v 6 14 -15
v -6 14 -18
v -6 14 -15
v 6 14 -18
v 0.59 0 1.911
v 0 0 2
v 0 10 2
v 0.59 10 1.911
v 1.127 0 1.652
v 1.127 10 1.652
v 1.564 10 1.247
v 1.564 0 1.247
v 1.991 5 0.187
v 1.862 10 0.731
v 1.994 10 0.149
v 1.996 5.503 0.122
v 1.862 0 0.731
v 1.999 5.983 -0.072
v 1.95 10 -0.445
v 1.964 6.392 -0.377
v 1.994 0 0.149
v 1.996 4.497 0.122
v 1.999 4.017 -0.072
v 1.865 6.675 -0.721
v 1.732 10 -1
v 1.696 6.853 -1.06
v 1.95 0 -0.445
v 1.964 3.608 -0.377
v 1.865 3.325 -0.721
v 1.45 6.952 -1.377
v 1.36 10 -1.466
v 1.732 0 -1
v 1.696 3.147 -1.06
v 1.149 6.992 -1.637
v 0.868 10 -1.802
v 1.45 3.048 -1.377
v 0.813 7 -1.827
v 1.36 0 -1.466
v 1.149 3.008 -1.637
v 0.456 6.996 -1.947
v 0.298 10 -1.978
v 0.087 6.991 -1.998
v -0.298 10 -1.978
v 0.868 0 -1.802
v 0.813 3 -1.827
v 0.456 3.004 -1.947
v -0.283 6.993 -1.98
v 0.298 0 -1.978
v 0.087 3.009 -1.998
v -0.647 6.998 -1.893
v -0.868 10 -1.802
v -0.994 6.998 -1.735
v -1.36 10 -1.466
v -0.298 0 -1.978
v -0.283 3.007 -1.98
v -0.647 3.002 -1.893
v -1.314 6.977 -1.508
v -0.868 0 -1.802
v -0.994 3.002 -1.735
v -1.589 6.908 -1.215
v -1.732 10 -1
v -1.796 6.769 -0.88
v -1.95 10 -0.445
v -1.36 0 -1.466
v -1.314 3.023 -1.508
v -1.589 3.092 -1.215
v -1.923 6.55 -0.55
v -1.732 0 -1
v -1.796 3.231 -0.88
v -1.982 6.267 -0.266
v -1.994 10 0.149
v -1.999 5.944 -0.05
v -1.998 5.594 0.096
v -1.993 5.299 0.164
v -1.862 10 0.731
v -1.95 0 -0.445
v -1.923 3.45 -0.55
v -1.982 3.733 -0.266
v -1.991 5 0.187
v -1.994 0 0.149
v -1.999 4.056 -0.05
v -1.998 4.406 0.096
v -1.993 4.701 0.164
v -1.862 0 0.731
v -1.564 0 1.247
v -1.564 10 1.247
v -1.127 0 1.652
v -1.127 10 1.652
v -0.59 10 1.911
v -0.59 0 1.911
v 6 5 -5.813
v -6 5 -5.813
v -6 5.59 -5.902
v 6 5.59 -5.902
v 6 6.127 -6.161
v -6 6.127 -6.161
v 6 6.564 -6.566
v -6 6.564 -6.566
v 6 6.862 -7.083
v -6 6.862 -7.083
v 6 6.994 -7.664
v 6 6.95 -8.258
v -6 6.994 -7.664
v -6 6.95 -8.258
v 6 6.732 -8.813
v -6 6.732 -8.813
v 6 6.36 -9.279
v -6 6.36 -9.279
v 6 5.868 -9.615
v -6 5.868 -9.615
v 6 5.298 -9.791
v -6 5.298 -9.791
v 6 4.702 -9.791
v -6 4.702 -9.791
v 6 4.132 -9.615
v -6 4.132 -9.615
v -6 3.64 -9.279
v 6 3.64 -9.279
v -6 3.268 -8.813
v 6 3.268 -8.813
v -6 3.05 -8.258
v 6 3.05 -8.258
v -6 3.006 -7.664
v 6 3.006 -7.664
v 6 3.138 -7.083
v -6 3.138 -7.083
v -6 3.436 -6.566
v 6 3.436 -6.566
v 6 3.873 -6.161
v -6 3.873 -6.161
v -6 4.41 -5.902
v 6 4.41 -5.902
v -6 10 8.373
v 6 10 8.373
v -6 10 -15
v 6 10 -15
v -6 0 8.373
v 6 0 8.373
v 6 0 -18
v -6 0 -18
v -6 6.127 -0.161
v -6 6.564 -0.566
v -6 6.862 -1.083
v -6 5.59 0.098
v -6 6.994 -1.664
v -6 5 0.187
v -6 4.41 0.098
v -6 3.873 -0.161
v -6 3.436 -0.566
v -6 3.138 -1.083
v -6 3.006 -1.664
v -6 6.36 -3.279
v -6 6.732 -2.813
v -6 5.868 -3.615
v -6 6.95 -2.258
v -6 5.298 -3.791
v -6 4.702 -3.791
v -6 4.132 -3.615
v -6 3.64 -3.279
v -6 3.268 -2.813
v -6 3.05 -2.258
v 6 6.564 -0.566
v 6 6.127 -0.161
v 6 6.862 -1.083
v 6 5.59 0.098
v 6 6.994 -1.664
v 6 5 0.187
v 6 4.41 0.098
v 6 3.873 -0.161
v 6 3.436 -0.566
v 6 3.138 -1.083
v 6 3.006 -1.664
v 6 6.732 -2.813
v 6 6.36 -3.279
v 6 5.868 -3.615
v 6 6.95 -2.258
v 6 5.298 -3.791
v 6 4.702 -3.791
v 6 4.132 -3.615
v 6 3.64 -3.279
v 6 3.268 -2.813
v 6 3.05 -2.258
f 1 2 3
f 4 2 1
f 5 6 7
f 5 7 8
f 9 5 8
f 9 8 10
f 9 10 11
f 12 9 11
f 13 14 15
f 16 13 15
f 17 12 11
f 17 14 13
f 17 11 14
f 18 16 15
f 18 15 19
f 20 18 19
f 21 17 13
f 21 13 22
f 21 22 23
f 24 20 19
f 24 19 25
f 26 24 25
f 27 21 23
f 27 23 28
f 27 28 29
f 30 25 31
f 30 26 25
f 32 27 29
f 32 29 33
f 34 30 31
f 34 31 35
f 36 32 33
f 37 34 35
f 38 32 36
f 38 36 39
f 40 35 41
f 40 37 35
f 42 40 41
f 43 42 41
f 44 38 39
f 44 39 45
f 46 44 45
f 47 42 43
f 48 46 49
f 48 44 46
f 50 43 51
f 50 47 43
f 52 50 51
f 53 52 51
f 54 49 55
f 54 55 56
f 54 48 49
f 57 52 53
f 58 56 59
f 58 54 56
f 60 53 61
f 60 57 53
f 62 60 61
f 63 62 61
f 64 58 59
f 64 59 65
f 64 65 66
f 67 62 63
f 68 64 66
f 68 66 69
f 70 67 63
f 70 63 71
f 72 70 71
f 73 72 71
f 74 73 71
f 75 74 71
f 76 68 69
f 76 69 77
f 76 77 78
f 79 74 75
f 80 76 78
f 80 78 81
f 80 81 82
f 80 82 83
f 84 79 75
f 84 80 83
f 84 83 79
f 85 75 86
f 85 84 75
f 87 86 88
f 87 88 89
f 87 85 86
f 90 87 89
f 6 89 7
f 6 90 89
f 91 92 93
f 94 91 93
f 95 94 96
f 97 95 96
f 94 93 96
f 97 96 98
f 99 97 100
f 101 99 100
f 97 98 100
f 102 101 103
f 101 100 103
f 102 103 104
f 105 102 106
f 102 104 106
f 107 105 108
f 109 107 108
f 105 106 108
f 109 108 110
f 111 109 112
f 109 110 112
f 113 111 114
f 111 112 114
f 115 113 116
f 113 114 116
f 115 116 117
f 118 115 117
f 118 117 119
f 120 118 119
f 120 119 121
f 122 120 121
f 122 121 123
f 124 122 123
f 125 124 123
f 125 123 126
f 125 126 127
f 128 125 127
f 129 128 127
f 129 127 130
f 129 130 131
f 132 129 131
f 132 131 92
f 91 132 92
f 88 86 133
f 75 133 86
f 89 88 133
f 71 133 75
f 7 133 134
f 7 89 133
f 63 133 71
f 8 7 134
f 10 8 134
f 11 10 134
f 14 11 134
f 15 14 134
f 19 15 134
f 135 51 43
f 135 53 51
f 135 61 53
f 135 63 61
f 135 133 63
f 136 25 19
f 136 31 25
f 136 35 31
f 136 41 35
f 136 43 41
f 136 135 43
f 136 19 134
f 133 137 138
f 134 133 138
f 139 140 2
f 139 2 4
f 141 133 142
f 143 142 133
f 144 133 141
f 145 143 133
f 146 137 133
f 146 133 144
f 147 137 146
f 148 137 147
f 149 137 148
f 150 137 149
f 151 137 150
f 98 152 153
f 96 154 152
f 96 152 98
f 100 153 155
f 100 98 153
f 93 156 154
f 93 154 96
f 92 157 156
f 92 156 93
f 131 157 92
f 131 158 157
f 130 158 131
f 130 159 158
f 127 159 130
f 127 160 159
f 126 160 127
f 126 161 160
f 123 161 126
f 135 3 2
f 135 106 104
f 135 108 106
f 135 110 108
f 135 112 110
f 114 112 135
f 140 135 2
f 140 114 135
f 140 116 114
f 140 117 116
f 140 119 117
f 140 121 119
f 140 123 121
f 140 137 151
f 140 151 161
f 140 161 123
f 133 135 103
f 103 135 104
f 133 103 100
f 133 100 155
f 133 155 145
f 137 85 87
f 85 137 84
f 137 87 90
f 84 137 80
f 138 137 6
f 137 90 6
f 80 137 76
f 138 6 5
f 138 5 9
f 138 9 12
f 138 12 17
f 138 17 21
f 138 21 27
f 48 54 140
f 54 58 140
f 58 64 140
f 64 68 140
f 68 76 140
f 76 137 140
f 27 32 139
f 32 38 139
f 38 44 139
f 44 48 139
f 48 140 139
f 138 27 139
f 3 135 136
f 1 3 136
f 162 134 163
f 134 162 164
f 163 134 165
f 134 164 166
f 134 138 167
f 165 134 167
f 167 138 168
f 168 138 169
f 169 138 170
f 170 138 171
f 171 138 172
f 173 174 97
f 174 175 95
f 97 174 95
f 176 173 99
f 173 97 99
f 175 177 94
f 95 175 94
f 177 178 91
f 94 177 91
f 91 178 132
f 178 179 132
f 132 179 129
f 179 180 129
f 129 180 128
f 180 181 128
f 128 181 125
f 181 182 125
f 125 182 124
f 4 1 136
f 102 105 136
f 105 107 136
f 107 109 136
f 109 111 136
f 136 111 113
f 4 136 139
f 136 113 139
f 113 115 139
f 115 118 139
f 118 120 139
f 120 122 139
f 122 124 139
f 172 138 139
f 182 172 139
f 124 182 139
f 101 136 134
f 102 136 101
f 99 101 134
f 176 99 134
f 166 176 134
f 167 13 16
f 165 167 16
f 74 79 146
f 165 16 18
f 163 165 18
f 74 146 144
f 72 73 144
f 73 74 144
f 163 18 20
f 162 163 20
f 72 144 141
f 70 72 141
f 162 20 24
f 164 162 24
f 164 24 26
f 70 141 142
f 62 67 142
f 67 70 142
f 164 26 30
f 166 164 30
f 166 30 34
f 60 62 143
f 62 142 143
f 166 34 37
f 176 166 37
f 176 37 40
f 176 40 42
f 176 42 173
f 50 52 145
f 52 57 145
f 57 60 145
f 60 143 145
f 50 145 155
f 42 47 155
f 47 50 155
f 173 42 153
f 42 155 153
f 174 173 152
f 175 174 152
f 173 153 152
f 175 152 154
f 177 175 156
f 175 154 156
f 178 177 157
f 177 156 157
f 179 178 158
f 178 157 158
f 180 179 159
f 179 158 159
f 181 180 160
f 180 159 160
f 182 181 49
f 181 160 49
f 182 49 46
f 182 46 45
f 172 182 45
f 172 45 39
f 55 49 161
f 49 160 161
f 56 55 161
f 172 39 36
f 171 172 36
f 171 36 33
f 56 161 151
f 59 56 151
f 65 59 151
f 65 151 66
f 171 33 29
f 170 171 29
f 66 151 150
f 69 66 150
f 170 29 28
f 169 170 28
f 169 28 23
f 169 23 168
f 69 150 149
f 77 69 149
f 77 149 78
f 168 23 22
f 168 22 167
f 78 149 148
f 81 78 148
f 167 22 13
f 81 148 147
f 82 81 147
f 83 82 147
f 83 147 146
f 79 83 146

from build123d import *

# Parameters (mm, degrees)
SKETCH1_W                = 12
SKETCH1_H                = 23.373361116
SKETCH1_R                = 2
BOSS_EXTRUDE1_DEPTH      = 10
BOSS_EXTRUDE2_DEPTH      = 4
BOSS_EXTRUDE2_DEPTH_BACK = 10
SKETCH2_W                = 12
SKETCH2_H                = 3
SKETCH3_R                = 2
CUT_EXTRUDE1_DEPTH       = 14


with BuildPart() as part:
    # Sketch1 → Boss-Extrude1 (new body)
    with BuildSketch(Plane(origin=(0, 0, 0), x_dir=(1, 0, 0), z_dir=(0, 1, 0))):
        with Locations((0, 3.313319442)):
            Rectangle(SKETCH1_W, SKETCH1_H)
        with Locations(Location((0, 0, 0), (0, 0, 270))):
            Circle(SKETCH1_R, mode=Mode.SUBTRACT)
    extrude(amount=BOSS_EXTRUDE1_DEPTH)

    # Sketch2 → Boss-Extrude2 (add, two sides: drawn at the far end of the back side and taken through both)
    with BuildSketch(Plane(origin=(0, 10, 0), x_dir=(1, 0, 0), z_dir=(0, 1, 0)).offset(-BOSS_EXTRUDE2_DEPTH_BACK)):
        with Locations((0, 16.5)):
            Rectangle(SKETCH2_W, SKETCH2_H)
    extrude(amount=BOSS_EXTRUDE2_DEPTH + BOSS_EXTRUDE2_DEPTH_BACK)

    # Sketch3 → Cut-Extrude1 (cut)
    with BuildSketch(Plane.ZY.offset(6)):
        with Locations((-7.813319442, 5)):
            Circle(SKETCH3_R)
        with Locations((-1.813319442, 5)):
            Circle(SKETCH3_R)
    extrude(amount=-CUT_EXTRUDE1_DEPTH, mode=Mode.SUBTRACT)


solid = part.part
